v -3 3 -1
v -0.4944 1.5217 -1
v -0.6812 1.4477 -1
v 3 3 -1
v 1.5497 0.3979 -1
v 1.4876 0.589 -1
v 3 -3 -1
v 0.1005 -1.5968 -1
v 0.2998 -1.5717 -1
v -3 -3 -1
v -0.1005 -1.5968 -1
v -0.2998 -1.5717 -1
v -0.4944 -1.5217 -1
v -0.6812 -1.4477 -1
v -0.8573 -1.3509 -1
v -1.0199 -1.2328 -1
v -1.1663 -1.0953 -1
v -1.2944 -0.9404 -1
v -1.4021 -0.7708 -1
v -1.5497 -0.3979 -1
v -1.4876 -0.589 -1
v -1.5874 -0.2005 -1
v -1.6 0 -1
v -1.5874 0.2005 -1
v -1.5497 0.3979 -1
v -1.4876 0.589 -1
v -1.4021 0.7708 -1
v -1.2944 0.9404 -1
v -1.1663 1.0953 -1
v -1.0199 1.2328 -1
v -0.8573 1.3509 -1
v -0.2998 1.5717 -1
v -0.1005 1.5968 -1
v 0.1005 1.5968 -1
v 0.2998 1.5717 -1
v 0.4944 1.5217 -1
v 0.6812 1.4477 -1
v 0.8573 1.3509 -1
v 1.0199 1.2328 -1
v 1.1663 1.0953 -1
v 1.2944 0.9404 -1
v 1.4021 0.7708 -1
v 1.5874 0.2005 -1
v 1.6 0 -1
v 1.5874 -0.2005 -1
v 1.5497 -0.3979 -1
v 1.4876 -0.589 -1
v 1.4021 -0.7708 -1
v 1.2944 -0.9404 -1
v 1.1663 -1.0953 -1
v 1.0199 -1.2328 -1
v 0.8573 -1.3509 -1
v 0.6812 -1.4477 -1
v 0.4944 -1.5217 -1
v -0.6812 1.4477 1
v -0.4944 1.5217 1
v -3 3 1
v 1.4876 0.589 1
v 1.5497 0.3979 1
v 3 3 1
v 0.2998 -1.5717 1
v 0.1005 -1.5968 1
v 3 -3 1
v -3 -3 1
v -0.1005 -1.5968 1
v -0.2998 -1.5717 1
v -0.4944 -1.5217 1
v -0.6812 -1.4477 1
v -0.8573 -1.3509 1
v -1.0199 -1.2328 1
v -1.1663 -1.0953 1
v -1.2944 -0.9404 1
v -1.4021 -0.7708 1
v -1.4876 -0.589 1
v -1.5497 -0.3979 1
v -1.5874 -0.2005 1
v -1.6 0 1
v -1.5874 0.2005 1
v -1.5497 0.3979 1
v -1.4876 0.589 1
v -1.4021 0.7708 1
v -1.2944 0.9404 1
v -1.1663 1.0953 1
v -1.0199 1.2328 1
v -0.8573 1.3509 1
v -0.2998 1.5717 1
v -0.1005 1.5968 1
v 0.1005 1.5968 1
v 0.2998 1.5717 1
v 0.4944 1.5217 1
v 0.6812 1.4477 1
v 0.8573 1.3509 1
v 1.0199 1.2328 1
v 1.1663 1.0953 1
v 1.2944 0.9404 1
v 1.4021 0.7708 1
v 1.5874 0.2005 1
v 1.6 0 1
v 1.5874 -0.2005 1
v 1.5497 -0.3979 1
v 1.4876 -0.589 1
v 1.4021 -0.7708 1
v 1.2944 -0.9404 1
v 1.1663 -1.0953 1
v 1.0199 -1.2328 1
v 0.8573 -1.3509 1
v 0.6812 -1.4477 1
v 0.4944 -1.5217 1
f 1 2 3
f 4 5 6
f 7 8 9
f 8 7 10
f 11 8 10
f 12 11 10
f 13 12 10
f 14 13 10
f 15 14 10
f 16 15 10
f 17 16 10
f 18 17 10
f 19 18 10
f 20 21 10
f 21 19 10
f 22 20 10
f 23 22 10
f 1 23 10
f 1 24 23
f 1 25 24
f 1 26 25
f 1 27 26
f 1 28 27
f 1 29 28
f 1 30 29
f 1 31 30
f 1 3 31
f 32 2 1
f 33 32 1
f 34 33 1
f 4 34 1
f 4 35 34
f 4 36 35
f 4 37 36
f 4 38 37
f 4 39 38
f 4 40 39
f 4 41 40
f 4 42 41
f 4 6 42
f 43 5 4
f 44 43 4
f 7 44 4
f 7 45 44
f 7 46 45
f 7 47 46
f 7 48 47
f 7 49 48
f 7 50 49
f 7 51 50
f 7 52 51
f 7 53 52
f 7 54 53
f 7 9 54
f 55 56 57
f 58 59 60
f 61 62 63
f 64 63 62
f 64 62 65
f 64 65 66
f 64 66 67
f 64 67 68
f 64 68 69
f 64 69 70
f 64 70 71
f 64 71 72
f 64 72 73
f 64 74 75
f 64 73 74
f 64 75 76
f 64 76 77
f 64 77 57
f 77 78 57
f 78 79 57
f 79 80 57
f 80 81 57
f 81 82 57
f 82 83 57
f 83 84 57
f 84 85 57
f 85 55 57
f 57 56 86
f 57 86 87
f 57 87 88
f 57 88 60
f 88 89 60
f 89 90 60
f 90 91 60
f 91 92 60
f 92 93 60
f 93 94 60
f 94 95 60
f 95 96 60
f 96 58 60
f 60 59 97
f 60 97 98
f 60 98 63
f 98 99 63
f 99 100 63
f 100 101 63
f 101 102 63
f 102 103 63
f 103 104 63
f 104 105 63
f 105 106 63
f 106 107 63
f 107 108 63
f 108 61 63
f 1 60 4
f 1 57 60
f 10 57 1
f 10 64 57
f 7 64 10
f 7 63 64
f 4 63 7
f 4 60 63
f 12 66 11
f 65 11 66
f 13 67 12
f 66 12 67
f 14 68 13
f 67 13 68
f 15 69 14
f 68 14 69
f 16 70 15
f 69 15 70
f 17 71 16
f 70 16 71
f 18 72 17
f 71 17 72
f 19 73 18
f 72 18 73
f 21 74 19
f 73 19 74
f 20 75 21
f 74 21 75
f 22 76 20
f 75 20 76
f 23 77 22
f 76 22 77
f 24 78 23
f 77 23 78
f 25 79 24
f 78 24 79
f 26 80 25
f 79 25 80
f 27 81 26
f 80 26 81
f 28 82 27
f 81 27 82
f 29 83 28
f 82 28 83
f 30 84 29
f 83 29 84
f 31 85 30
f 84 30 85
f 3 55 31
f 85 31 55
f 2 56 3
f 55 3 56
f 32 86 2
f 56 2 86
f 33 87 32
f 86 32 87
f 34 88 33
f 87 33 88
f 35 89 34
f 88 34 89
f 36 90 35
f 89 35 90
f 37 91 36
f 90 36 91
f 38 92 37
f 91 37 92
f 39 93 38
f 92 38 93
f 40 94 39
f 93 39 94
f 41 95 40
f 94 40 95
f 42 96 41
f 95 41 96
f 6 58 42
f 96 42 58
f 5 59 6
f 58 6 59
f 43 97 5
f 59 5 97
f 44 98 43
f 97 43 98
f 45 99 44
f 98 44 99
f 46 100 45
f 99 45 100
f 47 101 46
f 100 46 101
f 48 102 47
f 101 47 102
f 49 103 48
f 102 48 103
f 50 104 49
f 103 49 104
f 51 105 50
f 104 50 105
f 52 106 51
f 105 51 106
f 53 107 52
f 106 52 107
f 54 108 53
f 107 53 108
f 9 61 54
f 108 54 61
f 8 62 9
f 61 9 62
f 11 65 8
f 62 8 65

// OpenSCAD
// file: mounting.2d.scad
module mounting() {
  difference() {
    polygon(points=[
          [-3,-3],
          [3,-3],
          [3,3],
          [-3,3],
        ],convexity=10);
    circle(d=3.2, $fn=50);
  }
}

mounting();
// main file
use <mounting.2d.scad>;

linear_extrude(height = 2, center = true, convexity = 10, twist = 0) {
  mounting();
}
